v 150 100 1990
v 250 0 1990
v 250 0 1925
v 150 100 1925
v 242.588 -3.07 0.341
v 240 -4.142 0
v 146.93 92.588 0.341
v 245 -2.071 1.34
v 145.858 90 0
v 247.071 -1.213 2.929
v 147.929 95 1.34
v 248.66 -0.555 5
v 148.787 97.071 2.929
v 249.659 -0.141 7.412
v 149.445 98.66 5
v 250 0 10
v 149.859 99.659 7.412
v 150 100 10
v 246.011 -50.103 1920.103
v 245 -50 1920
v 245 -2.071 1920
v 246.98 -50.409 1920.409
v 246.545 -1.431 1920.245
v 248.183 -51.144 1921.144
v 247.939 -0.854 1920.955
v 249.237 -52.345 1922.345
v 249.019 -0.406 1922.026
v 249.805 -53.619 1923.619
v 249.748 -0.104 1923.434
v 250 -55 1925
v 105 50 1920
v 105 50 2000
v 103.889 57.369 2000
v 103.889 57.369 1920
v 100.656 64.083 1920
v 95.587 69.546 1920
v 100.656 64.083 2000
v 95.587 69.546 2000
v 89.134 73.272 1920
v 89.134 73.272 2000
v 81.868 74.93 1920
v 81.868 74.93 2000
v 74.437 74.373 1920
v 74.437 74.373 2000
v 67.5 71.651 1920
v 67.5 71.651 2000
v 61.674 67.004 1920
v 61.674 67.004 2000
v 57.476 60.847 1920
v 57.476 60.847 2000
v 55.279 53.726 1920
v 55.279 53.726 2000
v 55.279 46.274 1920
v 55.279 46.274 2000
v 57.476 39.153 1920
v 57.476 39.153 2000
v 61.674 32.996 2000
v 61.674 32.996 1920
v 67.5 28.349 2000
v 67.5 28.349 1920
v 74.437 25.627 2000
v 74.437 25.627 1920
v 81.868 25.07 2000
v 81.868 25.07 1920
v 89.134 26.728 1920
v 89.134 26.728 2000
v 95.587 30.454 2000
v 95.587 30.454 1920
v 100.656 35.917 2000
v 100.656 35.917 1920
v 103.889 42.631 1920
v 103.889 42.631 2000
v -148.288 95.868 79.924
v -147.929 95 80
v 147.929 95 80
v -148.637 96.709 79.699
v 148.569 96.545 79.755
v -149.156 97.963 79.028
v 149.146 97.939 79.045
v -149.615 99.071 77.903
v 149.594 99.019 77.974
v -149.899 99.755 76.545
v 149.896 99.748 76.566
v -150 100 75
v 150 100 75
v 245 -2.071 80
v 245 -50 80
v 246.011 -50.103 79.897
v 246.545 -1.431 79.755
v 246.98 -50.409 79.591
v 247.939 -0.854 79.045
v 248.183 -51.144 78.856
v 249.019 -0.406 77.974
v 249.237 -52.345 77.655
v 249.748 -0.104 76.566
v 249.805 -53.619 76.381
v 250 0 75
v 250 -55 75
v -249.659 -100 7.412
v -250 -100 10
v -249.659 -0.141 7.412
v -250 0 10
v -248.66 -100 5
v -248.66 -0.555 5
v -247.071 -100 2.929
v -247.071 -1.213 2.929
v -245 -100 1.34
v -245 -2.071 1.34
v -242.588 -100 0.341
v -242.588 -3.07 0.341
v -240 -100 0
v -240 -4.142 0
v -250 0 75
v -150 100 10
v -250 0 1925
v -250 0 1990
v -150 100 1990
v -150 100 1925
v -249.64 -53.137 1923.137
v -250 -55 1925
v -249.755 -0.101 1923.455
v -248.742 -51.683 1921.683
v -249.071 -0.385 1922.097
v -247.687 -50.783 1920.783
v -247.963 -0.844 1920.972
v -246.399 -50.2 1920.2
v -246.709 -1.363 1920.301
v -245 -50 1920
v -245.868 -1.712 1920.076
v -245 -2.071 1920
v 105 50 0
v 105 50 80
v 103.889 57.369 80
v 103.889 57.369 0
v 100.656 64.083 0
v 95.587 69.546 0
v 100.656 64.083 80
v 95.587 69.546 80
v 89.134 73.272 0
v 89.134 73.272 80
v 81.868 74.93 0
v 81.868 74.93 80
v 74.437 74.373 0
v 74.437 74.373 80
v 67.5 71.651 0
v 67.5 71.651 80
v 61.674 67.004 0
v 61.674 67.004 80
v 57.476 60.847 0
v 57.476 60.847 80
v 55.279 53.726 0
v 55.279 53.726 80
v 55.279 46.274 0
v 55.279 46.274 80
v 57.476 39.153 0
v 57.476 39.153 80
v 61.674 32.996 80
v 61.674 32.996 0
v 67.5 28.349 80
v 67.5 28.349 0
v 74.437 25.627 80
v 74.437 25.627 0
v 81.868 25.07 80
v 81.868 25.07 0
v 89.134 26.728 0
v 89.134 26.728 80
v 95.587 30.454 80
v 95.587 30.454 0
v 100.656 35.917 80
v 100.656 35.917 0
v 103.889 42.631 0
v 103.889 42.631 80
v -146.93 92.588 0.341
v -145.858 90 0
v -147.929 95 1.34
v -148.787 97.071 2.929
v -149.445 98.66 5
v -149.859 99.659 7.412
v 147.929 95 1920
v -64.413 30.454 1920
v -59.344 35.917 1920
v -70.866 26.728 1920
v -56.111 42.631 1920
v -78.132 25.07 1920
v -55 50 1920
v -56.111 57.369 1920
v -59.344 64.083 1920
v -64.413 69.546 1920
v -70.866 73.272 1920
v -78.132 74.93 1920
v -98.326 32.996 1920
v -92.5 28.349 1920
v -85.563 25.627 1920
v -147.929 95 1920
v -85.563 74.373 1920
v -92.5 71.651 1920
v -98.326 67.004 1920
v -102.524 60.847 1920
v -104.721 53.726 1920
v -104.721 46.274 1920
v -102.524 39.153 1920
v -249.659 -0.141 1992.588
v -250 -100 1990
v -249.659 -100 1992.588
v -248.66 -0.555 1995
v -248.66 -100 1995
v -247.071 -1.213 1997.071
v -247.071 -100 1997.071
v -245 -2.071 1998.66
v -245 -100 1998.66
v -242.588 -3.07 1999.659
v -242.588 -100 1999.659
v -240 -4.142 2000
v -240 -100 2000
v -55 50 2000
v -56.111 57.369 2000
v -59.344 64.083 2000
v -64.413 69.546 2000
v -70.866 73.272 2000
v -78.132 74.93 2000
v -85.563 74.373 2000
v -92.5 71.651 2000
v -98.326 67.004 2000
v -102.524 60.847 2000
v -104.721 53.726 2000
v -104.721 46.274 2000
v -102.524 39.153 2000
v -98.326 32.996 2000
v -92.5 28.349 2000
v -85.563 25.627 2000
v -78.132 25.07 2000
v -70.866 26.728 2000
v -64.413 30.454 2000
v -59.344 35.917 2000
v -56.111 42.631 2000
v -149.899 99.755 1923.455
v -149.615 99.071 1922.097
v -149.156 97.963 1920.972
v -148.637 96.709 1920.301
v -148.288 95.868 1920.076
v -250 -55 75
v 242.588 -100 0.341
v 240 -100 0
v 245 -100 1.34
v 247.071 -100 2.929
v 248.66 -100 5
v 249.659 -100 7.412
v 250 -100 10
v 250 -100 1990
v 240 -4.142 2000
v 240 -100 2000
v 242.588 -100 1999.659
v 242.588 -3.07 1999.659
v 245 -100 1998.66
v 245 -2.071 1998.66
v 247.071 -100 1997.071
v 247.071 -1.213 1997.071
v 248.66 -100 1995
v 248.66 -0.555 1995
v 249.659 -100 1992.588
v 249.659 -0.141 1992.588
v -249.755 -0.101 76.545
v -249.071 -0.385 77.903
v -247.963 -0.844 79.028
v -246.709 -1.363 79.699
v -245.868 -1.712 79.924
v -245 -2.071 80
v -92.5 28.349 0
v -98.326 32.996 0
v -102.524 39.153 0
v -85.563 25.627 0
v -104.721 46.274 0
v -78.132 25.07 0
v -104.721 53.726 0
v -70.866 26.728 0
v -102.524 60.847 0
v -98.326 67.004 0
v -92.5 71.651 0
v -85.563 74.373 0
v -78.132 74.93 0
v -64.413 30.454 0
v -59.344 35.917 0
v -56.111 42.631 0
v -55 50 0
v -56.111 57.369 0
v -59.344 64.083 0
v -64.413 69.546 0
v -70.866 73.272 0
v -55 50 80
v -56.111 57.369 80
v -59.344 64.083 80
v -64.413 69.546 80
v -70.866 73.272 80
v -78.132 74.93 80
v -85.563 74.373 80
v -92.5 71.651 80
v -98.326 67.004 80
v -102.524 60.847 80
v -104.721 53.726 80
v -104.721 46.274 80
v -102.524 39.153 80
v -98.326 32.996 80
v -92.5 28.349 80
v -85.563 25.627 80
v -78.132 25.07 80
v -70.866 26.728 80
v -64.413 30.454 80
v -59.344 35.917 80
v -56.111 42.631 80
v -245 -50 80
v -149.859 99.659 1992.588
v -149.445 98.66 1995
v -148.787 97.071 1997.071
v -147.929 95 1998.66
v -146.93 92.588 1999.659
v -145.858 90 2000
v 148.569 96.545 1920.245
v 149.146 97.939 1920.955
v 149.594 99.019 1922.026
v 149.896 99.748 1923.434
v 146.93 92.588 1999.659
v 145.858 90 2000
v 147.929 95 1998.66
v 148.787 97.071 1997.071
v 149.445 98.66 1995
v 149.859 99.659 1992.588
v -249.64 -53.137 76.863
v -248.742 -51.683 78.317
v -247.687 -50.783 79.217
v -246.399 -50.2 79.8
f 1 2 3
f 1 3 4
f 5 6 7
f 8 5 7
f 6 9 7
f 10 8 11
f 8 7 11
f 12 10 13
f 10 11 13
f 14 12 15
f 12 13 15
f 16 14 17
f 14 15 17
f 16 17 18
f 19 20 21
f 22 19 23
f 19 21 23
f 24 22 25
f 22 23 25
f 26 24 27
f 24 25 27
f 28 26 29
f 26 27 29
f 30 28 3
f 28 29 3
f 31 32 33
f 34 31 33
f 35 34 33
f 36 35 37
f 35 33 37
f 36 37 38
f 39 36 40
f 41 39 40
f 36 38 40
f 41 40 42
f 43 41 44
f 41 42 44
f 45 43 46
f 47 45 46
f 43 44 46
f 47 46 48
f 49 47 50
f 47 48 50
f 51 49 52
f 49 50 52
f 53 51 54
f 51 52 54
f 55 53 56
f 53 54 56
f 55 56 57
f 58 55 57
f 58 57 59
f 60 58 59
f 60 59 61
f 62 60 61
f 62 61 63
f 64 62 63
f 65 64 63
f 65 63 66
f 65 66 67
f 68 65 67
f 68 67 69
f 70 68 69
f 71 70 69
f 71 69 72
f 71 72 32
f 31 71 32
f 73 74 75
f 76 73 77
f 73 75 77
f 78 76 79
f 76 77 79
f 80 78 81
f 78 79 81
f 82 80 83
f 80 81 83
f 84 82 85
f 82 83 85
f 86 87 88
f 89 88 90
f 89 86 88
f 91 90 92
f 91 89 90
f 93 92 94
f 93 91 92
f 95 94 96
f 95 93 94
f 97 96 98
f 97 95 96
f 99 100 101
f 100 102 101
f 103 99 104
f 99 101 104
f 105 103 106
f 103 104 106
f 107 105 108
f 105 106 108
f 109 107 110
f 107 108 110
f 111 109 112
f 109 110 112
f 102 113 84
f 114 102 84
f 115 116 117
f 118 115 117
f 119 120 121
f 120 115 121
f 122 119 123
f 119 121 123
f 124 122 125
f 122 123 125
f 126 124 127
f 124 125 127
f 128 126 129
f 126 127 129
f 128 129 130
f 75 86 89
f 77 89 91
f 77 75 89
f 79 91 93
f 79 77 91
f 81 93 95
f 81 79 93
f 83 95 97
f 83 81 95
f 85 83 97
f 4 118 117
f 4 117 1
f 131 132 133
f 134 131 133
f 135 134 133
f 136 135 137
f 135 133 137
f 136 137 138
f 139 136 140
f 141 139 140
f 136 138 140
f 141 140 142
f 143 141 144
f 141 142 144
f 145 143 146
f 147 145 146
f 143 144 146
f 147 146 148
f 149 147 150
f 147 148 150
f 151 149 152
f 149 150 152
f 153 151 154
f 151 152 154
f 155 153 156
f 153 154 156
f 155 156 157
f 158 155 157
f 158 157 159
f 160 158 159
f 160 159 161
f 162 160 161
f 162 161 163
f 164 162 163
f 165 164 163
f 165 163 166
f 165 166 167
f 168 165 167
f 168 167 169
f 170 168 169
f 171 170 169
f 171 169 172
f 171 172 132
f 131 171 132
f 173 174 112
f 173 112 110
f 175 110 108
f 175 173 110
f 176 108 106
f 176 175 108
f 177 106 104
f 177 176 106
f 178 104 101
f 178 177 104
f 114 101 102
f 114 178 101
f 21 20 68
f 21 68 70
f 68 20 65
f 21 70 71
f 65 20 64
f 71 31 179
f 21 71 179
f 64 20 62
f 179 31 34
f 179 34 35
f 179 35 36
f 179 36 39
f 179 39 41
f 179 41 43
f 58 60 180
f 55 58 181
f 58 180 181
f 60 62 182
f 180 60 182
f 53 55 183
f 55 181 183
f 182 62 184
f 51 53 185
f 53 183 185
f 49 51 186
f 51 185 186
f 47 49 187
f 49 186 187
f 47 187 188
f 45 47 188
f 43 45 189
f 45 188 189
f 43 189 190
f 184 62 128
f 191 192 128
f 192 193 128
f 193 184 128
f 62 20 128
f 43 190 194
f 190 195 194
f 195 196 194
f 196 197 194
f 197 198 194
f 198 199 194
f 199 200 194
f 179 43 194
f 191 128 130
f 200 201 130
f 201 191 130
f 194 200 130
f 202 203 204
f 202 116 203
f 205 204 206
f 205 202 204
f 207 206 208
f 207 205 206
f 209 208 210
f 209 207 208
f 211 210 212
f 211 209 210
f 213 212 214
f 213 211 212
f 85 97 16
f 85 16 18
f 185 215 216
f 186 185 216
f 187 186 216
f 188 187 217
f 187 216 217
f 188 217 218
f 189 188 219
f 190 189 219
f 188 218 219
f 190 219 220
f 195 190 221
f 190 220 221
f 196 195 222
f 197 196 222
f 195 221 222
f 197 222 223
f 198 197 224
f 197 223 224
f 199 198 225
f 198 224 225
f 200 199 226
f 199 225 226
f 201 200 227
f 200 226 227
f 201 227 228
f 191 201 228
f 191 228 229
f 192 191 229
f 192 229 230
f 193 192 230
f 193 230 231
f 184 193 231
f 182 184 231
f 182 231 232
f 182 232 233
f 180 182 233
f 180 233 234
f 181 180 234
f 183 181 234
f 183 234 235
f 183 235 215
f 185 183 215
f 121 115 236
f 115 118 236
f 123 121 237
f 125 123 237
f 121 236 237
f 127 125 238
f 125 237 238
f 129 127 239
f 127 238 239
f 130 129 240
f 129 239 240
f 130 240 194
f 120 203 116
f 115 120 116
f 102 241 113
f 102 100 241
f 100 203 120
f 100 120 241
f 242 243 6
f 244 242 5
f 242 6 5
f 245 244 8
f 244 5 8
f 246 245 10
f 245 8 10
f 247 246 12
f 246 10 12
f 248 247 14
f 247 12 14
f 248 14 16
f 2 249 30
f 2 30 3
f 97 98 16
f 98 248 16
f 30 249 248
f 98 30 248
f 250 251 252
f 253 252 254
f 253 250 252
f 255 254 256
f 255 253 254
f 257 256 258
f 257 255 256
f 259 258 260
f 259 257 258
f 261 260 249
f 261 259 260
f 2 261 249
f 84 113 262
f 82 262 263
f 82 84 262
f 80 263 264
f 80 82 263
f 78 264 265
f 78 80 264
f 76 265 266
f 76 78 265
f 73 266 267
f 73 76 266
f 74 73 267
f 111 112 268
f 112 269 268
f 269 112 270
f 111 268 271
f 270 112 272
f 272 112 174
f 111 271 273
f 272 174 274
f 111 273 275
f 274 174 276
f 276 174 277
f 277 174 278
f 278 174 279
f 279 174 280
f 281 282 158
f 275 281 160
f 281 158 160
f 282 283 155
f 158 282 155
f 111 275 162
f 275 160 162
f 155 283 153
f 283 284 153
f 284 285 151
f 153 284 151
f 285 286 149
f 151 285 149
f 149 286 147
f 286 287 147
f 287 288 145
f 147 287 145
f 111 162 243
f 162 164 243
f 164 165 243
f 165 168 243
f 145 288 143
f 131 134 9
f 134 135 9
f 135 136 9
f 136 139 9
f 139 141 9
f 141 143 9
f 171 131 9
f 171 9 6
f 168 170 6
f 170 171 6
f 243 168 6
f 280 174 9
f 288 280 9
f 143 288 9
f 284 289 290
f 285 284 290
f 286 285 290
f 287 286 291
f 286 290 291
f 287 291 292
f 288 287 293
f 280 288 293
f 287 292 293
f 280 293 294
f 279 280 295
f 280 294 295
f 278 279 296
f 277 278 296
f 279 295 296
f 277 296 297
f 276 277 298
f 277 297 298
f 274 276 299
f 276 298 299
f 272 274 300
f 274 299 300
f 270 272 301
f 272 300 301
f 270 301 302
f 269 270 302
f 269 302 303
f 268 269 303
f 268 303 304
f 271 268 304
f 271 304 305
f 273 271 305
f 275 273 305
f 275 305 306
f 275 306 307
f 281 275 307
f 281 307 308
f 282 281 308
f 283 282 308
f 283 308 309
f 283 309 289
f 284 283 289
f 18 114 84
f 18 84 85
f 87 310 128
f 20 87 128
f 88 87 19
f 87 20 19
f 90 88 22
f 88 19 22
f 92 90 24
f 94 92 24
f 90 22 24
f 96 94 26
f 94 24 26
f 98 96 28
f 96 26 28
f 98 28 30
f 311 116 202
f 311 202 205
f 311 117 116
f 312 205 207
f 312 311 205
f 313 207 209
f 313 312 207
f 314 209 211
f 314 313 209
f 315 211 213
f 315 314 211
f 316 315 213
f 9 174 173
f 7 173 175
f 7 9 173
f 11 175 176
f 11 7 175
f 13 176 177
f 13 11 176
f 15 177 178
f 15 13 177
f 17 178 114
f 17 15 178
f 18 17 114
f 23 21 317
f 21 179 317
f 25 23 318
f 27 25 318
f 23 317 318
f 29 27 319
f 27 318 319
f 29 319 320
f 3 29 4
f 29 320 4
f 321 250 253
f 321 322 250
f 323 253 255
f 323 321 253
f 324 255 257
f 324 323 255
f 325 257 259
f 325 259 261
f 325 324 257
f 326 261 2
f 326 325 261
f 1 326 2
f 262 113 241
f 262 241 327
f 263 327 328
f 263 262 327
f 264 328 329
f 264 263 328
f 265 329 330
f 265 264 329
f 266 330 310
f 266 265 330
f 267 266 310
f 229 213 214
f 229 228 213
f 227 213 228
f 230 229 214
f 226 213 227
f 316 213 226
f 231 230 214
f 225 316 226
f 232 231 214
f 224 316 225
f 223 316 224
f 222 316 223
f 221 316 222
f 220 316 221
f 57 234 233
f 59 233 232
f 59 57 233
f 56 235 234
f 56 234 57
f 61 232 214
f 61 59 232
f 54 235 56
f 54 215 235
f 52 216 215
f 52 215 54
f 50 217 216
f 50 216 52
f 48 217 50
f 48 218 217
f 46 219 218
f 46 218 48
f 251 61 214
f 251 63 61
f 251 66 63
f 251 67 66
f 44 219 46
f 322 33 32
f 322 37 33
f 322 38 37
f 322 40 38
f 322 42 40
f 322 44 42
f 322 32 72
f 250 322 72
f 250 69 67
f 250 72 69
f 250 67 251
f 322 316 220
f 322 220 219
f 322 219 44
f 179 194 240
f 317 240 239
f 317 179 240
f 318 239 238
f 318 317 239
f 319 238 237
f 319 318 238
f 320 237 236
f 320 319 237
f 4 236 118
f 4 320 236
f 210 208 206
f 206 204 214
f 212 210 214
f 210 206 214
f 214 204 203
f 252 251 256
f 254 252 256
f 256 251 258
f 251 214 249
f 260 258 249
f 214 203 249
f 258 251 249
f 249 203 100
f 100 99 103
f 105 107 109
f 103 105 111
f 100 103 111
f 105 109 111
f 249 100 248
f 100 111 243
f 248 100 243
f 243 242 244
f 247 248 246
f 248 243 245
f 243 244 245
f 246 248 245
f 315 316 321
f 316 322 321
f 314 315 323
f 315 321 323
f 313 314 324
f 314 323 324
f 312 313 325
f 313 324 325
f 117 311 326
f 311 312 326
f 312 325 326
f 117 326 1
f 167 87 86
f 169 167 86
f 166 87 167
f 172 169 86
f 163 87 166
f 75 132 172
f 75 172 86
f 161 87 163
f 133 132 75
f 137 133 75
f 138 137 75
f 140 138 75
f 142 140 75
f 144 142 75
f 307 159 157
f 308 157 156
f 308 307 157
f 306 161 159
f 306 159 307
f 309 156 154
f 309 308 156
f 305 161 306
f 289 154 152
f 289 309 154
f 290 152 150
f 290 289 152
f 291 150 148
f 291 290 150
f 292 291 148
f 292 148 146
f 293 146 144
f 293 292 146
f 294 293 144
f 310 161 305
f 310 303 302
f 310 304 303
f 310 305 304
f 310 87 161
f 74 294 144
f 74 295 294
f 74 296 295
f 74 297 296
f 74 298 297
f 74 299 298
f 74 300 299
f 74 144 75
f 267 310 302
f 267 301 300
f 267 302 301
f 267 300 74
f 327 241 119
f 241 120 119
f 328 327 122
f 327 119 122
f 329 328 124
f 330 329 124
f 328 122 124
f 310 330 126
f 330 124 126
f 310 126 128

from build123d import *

# Parameters (mm, degrees)
SKETCH1_W           = 500
SKETCH1_H           = 200
BOSS_EXTRUDE1_DEPTH = 2000
SKETCH3_W           = 1840
SKETCH3_H           = 150
CUT_EXTRUDE1_DEPTH  = 1000
CUT_EXTRUDE2_DEPTH  = 2001
SKETCH4_R           = 25
CUT_EXTRUDE3_DEPTH  = 2001
FILLET1_R           = 10
FILLET2_R           = 10
FILLET4_R           = 5


with BuildPart() as part:
    # Sketch1 → Boss-Extrude1 (new body)
    with BuildSketch(Plane.XY):
        Rectangle(SKETCH1_W, SKETCH1_H)
    extrude(amount=BOSS_EXTRUDE1_DEPTH)

    # Sketch3 → Cut-Extrude1 (cut)
    with BuildSketch(Plane.ZY.offset(250)):
        with Locations((1000, 25)):
            Rectangle(SKETCH3_W, SKETCH3_H)
    extrude(amount=-CUT_EXTRUDE1_DEPTH, mode=Mode.SUBTRACT)

    # Sketch2 → Cut-Extrude2 (cut, through all)
    with BuildSketch(Plane.XY.offset(2000)):
        Polygon((-250, 0), (-150, 100), (-250, 100), align=None)
        Polygon((250, 0), (150, 100), (250, 100), align=None)
    extrude(amount=-CUT_EXTRUDE2_DEPTH, mode=Mode.SUBTRACT)

    # Sketch4 → Cut-Extrude3 (cut, through all)
    with BuildSketch(Plane.XY.offset(2000)):
        with Locations((-80, 50)):
            Circle(SKETCH4_R)
        with Locations((80, 50)):
            Circle(SKETCH4_R)
    extrude(amount=-CUT_EXTRUDE3_DEPTH, mode=Mode.SUBTRACT)

    # Fillet1
    fillet1_edges = [part.edges().sort_by_distance(p)[0] for p in [
        (-250, -50, 2000),
        (250, -50, 2000),
        (-200, 50, 2000),
        (0, 100, 2000),
        (200, 50, 2000),
    ]]
    fillet(fillet1_edges, radius=FILLET1_R)

    # Fillet2
    fillet2_edges = [part.edges().sort_by_distance(p)[0] for p in [
        (-250, -50, 0),
        (-200, 50, 0),
        (0, 100, 0),
        (250, -50, 0),
        (200, 50, 0),
    ]]
    fillet(fillet2_edges, radius=FILLET2_R)

    # Fillet4
    fillet4_edges = [part.edges().sort_by_distance(p)[0] for p in [
        (250, -25, 1920),
        (250, -50, 1000),
        (-250, -50, 1000),
        (-250, -25, 1920),
        (-200, 50, 1920),
        (-250, -25, 80),
        (-200, 50, 80),
        (0, 100, 1920),
        (200, 50, 1920),
        (0, 100, 80),
        (250, -25, 80),
        (200, 50, 80),
    ]]
    fillet(fillet4_edges, radius=FILLET4_R)


solid = part.part
